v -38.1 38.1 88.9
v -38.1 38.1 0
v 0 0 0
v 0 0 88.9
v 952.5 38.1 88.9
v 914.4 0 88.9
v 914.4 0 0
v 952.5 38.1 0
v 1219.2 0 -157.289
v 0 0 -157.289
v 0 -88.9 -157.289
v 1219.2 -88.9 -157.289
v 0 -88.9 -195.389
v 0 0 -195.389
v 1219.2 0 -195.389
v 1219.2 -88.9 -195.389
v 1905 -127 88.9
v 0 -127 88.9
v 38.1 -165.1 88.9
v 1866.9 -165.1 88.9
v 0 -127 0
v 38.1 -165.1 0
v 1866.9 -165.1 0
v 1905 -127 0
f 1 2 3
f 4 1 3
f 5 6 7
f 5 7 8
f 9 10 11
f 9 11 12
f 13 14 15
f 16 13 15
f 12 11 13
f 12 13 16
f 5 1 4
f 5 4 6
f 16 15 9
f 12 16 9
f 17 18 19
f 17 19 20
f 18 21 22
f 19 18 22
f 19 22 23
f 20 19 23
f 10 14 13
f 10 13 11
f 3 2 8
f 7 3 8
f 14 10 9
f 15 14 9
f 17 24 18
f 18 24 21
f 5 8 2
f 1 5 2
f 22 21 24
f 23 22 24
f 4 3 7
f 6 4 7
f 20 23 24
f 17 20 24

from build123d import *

# Parameters (mm, degrees)
F1_DEPTH = 88.9
F3_DEPTH = 88.9
F4_W     = 1219.2
F4_H     = 38.1
F5_DEPTH = 88.9


with BuildPart() as f1:
    # F0 (on Top) → F1 (new body)
    with BuildSketch(Plane.XY):
        Polygon((-38.1, 38.1), (0, 0), (914.4, 0), (952.5, 38.1), align=None)
    extrude(amount=F1_DEPTH)


with BuildPart() as f3:
    # F2 (on Top) → F3 (new body)
    with BuildSketch(Plane.XY):
        Polygon((0, -127), (38.1, -165.1), (1866.9, -165.1), (1905, -127), align=None)
    extrude(amount=F3_DEPTH)


with BuildPart() as f5:
    # F4 (on Front) → F5 (new body)
    with BuildSketch(Plane.XZ):
        with Locations((609.6, -176.338538)):
            Rectangle(F4_W, F4_H)
    extrude(amount=F5_DEPTH)


solid = Compound([f1.part, f3.part, f5.part])
